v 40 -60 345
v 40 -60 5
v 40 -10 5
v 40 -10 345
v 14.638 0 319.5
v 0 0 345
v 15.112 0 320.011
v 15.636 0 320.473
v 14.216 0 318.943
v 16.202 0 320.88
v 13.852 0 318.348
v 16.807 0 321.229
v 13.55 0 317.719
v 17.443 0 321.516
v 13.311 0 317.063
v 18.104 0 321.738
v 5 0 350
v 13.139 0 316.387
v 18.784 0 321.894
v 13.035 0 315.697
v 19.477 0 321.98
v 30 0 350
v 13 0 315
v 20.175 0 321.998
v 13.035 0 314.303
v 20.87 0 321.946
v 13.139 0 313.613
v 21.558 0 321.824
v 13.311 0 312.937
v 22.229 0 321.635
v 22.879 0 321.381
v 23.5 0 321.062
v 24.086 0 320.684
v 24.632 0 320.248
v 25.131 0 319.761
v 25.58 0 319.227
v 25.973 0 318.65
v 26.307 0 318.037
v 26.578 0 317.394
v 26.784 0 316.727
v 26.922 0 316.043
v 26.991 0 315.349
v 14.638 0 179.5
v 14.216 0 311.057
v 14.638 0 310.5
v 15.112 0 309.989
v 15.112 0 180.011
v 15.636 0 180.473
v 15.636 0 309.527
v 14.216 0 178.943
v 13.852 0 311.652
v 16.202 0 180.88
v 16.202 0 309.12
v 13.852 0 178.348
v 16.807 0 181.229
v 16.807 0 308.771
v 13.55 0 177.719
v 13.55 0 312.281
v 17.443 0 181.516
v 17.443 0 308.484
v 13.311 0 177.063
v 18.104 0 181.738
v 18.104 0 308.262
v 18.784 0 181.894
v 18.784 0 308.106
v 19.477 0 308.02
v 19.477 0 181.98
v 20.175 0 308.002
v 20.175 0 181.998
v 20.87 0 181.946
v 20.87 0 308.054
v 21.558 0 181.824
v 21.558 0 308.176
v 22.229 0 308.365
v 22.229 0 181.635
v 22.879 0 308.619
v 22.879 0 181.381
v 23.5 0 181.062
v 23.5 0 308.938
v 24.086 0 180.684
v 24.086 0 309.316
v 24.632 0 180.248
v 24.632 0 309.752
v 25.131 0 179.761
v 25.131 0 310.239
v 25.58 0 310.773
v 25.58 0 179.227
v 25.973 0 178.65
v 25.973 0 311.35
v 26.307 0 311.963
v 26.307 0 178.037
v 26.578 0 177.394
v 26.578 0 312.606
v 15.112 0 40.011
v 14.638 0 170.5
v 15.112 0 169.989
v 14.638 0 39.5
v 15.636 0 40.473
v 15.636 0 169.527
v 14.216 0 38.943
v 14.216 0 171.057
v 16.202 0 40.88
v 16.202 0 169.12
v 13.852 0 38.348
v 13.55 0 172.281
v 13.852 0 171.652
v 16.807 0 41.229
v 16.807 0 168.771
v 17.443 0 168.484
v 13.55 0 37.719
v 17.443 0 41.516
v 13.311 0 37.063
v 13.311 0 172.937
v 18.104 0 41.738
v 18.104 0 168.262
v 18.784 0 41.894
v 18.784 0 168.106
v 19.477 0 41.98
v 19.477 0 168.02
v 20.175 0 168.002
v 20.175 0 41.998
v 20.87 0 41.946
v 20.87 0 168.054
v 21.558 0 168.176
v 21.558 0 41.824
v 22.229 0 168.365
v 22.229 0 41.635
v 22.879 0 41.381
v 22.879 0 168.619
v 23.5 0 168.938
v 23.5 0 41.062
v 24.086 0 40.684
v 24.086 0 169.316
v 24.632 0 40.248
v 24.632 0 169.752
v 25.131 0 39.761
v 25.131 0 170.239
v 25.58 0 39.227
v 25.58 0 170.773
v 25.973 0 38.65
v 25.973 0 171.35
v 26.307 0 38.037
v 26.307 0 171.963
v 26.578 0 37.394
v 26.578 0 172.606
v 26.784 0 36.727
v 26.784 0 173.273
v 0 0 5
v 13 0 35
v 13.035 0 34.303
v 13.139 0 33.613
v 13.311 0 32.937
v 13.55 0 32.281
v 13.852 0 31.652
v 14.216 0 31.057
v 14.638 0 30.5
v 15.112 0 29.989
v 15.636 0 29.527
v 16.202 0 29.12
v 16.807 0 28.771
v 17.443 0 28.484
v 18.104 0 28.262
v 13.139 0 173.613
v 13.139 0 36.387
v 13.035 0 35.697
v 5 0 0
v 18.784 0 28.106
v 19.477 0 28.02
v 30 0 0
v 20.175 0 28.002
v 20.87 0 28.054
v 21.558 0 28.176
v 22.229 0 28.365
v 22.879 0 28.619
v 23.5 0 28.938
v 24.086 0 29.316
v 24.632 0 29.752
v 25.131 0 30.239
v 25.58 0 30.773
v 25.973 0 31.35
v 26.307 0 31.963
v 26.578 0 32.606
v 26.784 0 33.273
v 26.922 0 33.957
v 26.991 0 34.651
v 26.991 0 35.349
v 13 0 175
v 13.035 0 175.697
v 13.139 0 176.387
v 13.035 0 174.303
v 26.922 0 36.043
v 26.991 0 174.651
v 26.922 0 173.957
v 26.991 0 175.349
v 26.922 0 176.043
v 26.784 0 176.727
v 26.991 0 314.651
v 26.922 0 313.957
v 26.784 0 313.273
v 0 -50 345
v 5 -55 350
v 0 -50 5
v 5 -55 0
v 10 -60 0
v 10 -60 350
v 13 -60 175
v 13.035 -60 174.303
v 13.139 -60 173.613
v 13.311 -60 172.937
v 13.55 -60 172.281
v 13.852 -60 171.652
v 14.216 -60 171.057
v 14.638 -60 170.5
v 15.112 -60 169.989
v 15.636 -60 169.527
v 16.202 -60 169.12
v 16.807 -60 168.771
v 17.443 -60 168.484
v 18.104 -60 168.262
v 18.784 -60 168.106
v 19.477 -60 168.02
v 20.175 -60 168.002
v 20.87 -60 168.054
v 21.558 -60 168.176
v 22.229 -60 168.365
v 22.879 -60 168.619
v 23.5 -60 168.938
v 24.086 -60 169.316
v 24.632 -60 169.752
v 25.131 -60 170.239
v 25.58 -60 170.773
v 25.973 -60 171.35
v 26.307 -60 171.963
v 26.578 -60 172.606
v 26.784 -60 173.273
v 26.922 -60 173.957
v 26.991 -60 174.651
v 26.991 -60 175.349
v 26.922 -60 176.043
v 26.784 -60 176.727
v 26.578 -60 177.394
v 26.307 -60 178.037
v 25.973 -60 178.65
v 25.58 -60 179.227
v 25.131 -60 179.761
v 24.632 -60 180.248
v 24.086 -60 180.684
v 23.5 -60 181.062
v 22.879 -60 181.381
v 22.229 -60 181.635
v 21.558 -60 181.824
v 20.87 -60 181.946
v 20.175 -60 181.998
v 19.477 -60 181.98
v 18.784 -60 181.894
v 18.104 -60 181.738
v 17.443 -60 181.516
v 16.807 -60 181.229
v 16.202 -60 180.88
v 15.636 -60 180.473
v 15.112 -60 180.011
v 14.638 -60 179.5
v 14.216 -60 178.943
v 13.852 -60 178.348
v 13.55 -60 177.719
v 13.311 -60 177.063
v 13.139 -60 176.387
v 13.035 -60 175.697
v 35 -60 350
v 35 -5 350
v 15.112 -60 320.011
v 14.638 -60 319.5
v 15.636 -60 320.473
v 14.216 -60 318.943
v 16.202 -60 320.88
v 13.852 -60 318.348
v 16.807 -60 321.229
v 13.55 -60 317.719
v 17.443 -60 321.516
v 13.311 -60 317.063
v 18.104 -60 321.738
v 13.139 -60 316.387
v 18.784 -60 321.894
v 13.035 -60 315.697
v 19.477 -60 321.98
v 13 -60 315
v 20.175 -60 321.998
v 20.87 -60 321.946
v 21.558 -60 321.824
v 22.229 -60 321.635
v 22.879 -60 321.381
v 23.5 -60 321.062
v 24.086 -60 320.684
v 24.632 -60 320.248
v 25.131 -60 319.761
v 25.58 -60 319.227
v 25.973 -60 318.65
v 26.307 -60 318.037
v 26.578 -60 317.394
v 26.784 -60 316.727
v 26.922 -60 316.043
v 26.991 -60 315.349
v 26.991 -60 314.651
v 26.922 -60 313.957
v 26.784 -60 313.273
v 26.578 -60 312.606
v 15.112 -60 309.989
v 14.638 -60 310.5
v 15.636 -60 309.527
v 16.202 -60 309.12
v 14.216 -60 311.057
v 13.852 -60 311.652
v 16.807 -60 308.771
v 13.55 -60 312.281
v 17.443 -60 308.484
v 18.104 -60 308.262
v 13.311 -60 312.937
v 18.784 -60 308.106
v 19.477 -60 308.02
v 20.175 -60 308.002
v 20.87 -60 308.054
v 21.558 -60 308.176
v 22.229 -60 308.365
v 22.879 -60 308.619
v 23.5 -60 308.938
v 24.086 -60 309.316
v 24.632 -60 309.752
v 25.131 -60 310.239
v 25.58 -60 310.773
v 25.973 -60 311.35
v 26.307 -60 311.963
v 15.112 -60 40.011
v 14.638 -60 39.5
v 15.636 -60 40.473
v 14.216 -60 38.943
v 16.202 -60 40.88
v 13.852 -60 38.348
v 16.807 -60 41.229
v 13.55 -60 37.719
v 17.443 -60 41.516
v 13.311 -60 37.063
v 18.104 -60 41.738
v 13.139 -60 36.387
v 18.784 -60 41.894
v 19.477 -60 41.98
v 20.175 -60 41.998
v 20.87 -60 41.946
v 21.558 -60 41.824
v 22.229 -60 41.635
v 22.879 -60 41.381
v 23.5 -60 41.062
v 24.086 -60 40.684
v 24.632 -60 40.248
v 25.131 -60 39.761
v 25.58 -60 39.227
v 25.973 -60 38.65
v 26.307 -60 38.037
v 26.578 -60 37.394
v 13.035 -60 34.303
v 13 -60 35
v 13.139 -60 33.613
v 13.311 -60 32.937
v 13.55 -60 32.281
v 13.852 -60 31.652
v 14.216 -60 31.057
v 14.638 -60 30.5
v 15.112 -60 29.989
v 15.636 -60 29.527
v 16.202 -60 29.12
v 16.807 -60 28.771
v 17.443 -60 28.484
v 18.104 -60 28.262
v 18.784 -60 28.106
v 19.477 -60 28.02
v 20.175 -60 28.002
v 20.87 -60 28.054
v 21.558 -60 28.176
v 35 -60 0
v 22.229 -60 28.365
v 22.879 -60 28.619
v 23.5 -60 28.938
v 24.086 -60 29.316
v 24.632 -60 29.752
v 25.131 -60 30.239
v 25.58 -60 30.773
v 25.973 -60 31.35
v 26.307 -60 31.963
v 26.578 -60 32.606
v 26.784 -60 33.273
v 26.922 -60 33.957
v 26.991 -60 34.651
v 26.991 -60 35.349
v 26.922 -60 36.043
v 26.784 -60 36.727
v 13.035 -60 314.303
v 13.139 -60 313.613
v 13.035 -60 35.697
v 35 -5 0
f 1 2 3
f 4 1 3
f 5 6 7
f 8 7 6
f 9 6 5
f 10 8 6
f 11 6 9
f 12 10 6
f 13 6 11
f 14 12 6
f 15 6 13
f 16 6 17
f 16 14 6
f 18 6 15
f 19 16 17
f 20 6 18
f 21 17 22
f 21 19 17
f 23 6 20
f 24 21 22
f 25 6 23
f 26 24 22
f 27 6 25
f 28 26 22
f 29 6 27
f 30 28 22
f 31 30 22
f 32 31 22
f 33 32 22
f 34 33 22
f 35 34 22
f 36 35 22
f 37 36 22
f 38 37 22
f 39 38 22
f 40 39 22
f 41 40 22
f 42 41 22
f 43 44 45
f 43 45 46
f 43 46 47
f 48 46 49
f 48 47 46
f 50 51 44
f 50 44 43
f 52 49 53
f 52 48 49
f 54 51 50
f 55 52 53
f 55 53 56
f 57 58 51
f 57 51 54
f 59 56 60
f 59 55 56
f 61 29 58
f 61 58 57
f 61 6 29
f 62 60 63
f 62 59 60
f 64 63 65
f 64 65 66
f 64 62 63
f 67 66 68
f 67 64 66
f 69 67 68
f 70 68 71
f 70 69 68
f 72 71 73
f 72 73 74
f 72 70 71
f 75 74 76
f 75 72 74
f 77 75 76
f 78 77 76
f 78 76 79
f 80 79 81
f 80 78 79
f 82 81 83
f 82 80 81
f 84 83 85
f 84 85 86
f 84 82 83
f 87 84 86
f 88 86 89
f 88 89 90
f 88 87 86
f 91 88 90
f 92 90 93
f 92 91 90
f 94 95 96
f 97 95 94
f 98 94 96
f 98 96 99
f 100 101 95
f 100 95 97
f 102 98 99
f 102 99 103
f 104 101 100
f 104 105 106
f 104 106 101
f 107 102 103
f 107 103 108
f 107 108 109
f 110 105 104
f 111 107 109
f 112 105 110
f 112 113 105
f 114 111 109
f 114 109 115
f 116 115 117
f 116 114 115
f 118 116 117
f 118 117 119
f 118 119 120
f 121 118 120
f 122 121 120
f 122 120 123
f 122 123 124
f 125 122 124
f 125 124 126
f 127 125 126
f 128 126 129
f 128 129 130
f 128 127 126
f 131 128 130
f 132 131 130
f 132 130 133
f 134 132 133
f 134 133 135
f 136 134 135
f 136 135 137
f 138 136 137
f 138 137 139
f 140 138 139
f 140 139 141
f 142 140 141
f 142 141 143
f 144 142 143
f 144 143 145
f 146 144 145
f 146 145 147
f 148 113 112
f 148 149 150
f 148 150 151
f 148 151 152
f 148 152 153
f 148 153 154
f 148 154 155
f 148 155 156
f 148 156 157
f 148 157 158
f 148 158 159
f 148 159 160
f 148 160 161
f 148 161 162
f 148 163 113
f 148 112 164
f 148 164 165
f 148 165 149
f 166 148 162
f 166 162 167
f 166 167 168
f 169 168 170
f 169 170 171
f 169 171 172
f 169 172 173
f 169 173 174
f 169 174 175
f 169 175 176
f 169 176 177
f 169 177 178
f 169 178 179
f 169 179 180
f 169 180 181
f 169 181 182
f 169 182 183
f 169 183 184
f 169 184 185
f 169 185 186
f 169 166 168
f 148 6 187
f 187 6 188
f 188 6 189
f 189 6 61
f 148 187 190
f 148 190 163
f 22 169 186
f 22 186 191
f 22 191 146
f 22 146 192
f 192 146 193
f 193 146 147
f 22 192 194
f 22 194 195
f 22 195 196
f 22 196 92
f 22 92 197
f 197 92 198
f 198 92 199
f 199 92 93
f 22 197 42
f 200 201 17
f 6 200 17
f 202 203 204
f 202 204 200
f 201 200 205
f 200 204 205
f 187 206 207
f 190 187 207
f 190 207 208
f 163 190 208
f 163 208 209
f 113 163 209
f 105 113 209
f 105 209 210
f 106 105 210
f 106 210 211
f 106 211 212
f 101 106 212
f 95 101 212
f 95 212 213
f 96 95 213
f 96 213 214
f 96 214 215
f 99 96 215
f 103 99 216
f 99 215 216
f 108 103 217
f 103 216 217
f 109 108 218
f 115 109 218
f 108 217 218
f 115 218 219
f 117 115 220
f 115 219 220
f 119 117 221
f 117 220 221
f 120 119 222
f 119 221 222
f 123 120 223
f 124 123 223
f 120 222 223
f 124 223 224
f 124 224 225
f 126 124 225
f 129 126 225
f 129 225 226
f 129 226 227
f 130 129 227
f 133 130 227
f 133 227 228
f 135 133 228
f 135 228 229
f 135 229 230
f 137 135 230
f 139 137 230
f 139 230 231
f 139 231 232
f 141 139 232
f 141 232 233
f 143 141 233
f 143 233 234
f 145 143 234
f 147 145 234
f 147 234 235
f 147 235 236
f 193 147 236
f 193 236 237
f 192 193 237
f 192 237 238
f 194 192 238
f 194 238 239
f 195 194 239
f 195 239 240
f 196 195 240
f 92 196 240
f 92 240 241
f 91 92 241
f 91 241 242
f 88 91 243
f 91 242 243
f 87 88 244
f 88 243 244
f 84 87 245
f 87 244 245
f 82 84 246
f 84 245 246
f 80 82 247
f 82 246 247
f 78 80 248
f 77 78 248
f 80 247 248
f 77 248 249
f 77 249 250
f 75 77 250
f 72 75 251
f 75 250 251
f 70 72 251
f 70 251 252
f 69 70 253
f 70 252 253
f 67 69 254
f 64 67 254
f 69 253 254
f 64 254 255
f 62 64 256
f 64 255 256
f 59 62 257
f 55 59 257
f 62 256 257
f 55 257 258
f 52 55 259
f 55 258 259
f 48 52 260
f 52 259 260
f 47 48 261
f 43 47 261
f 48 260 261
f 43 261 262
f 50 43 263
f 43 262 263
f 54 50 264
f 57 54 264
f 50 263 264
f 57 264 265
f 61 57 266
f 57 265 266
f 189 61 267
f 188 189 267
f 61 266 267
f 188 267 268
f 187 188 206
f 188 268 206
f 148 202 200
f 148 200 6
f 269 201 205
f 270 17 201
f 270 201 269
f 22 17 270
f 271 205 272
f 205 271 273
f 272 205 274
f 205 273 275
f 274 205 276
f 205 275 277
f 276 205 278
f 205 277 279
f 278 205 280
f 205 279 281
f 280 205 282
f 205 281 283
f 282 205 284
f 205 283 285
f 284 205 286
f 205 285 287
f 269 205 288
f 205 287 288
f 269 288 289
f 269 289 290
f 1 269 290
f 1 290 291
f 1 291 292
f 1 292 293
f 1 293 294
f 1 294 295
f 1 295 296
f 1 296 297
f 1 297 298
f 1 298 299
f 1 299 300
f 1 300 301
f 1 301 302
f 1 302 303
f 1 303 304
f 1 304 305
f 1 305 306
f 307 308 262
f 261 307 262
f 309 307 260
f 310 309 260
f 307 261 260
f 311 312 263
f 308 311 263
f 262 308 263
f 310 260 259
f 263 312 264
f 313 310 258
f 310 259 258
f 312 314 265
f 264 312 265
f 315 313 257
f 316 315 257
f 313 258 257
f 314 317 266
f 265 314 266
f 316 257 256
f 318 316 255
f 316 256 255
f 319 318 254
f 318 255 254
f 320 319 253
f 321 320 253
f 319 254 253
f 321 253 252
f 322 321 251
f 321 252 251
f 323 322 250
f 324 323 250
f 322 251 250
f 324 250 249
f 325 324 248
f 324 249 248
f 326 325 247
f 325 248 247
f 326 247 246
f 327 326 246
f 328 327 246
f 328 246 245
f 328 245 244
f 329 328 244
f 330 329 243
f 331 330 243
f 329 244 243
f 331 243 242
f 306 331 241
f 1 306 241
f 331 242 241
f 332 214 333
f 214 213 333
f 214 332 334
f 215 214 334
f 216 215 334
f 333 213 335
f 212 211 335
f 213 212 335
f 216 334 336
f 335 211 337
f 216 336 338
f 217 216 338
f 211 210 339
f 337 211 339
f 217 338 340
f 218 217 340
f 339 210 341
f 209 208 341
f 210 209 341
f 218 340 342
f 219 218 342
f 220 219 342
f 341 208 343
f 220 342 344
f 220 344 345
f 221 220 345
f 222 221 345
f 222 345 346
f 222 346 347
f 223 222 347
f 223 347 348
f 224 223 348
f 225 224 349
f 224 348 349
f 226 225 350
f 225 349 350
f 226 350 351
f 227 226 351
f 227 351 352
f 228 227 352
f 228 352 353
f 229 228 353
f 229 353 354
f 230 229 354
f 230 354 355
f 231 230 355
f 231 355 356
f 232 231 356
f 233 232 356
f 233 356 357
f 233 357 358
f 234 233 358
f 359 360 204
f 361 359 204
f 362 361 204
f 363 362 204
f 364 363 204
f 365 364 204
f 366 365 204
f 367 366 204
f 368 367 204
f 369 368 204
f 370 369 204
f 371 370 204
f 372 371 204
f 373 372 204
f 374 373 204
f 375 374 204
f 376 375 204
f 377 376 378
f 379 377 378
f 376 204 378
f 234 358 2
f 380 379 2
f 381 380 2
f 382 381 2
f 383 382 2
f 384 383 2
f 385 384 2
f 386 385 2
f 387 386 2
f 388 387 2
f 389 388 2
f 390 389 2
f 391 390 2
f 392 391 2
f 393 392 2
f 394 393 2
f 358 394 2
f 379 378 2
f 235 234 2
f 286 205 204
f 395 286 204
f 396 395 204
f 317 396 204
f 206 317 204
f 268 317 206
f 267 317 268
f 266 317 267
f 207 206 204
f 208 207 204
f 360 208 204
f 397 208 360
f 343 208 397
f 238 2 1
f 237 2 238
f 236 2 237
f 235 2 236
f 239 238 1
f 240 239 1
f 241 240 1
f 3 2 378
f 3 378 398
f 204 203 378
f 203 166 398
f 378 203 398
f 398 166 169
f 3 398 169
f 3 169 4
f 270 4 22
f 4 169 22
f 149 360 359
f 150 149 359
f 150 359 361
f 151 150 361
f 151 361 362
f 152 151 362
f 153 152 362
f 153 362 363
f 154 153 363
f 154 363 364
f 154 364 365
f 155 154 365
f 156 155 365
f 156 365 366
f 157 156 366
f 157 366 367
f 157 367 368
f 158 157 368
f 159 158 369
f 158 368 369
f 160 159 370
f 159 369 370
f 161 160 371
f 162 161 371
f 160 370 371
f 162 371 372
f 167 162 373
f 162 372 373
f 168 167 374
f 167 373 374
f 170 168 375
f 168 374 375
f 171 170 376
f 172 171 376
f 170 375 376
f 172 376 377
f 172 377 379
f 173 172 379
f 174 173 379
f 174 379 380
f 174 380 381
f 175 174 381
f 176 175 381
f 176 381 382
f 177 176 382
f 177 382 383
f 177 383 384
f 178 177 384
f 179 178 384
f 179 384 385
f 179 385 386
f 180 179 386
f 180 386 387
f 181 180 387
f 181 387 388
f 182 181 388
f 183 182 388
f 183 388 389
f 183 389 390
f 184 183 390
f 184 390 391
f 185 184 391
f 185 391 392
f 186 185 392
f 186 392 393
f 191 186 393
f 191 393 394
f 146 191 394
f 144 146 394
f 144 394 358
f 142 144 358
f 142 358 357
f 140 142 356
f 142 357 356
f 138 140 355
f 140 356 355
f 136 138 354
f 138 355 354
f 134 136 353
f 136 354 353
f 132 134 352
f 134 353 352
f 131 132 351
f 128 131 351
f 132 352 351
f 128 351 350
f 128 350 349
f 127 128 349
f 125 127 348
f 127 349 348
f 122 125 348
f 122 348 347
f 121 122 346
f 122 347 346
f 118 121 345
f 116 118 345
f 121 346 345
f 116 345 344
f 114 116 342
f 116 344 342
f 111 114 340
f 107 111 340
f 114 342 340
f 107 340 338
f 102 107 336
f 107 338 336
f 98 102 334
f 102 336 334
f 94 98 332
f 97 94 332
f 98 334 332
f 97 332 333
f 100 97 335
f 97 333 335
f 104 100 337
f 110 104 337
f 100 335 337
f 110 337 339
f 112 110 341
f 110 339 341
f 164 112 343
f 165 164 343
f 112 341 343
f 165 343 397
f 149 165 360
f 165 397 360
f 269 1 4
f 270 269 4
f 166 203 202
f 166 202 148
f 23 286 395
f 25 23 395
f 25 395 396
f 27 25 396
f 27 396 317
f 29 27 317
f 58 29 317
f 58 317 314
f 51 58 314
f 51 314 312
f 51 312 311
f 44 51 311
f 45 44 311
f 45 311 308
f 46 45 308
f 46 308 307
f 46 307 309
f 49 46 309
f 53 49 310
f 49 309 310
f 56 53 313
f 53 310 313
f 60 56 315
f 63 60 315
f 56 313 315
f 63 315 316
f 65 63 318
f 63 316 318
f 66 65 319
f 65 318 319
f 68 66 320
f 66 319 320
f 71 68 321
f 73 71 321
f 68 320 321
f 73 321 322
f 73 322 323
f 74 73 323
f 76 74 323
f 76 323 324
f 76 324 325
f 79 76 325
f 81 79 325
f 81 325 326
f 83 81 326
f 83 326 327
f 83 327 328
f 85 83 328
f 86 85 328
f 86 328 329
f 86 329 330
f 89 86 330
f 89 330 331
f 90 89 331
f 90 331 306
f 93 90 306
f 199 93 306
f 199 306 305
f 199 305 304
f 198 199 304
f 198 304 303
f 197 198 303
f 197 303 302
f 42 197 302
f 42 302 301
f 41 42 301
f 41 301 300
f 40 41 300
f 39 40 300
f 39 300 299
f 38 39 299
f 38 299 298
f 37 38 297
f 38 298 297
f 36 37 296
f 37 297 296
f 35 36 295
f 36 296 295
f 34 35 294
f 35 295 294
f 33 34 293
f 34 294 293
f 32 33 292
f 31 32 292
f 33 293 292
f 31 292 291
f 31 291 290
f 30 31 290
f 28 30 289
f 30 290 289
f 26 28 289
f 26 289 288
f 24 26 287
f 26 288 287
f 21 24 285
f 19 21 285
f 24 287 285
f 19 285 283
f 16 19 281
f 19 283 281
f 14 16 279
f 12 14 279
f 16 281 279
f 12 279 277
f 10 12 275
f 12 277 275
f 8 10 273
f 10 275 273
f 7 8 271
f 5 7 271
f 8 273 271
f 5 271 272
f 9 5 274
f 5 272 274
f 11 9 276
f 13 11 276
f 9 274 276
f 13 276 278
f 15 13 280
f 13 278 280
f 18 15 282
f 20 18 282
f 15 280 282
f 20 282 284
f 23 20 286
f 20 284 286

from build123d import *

# Parameters (mm, degrees)
SKETCH_1_W          = 40
SKETCH_1_H          = 60
EXTRUDE_1_DEPTH     = 350
CHAMFER_1_SIZE      = 10
HOLE_WIZARD_M16_1_D = 14
CHAMFER_2_SIZE      = 5


with BuildPart() as part:
    # 草图1 → 凸台-拉伸1 (new body)
    with BuildSketch(Plane.XY):
        with Locations((20, -30)):
            Rectangle(SKETCH_1_W, SKETCH_1_H)
    extrude(amount=EXTRUDE_1_DEPTH)

    # 倒角1
    chamfer_1_edges = [part.edges().sort_by_distance(p)[0] for p in [
        (40, 0, 175),
        (0, -60, 175),
    ]]
    chamfer(chamfer_1_edges, length=CHAMFER_1_SIZE)

    # M16 螺纹孔1 (through all)
    with Locations(Plane(origin=(0, 0, 0), x_dir=(1, 0, 0), z_dir=(0, 1, 0))):
        with Locations((20, -315), (20, -175), (20, -35)):
            Hole(HOLE_WIZARD_M16_1_D / 2)

    # 倒角2
    chamfer_2_edges = [part.edges().sort_by_distance(p)[0] for p in [
        (40, -35, 350),
        (0, -25, 350),
        (40, -35, 0),
        (0, -25, 0),
    ]]
    chamfer(chamfer_2_edges, length=CHAMFER_2_SIZE)


solid = part.part
